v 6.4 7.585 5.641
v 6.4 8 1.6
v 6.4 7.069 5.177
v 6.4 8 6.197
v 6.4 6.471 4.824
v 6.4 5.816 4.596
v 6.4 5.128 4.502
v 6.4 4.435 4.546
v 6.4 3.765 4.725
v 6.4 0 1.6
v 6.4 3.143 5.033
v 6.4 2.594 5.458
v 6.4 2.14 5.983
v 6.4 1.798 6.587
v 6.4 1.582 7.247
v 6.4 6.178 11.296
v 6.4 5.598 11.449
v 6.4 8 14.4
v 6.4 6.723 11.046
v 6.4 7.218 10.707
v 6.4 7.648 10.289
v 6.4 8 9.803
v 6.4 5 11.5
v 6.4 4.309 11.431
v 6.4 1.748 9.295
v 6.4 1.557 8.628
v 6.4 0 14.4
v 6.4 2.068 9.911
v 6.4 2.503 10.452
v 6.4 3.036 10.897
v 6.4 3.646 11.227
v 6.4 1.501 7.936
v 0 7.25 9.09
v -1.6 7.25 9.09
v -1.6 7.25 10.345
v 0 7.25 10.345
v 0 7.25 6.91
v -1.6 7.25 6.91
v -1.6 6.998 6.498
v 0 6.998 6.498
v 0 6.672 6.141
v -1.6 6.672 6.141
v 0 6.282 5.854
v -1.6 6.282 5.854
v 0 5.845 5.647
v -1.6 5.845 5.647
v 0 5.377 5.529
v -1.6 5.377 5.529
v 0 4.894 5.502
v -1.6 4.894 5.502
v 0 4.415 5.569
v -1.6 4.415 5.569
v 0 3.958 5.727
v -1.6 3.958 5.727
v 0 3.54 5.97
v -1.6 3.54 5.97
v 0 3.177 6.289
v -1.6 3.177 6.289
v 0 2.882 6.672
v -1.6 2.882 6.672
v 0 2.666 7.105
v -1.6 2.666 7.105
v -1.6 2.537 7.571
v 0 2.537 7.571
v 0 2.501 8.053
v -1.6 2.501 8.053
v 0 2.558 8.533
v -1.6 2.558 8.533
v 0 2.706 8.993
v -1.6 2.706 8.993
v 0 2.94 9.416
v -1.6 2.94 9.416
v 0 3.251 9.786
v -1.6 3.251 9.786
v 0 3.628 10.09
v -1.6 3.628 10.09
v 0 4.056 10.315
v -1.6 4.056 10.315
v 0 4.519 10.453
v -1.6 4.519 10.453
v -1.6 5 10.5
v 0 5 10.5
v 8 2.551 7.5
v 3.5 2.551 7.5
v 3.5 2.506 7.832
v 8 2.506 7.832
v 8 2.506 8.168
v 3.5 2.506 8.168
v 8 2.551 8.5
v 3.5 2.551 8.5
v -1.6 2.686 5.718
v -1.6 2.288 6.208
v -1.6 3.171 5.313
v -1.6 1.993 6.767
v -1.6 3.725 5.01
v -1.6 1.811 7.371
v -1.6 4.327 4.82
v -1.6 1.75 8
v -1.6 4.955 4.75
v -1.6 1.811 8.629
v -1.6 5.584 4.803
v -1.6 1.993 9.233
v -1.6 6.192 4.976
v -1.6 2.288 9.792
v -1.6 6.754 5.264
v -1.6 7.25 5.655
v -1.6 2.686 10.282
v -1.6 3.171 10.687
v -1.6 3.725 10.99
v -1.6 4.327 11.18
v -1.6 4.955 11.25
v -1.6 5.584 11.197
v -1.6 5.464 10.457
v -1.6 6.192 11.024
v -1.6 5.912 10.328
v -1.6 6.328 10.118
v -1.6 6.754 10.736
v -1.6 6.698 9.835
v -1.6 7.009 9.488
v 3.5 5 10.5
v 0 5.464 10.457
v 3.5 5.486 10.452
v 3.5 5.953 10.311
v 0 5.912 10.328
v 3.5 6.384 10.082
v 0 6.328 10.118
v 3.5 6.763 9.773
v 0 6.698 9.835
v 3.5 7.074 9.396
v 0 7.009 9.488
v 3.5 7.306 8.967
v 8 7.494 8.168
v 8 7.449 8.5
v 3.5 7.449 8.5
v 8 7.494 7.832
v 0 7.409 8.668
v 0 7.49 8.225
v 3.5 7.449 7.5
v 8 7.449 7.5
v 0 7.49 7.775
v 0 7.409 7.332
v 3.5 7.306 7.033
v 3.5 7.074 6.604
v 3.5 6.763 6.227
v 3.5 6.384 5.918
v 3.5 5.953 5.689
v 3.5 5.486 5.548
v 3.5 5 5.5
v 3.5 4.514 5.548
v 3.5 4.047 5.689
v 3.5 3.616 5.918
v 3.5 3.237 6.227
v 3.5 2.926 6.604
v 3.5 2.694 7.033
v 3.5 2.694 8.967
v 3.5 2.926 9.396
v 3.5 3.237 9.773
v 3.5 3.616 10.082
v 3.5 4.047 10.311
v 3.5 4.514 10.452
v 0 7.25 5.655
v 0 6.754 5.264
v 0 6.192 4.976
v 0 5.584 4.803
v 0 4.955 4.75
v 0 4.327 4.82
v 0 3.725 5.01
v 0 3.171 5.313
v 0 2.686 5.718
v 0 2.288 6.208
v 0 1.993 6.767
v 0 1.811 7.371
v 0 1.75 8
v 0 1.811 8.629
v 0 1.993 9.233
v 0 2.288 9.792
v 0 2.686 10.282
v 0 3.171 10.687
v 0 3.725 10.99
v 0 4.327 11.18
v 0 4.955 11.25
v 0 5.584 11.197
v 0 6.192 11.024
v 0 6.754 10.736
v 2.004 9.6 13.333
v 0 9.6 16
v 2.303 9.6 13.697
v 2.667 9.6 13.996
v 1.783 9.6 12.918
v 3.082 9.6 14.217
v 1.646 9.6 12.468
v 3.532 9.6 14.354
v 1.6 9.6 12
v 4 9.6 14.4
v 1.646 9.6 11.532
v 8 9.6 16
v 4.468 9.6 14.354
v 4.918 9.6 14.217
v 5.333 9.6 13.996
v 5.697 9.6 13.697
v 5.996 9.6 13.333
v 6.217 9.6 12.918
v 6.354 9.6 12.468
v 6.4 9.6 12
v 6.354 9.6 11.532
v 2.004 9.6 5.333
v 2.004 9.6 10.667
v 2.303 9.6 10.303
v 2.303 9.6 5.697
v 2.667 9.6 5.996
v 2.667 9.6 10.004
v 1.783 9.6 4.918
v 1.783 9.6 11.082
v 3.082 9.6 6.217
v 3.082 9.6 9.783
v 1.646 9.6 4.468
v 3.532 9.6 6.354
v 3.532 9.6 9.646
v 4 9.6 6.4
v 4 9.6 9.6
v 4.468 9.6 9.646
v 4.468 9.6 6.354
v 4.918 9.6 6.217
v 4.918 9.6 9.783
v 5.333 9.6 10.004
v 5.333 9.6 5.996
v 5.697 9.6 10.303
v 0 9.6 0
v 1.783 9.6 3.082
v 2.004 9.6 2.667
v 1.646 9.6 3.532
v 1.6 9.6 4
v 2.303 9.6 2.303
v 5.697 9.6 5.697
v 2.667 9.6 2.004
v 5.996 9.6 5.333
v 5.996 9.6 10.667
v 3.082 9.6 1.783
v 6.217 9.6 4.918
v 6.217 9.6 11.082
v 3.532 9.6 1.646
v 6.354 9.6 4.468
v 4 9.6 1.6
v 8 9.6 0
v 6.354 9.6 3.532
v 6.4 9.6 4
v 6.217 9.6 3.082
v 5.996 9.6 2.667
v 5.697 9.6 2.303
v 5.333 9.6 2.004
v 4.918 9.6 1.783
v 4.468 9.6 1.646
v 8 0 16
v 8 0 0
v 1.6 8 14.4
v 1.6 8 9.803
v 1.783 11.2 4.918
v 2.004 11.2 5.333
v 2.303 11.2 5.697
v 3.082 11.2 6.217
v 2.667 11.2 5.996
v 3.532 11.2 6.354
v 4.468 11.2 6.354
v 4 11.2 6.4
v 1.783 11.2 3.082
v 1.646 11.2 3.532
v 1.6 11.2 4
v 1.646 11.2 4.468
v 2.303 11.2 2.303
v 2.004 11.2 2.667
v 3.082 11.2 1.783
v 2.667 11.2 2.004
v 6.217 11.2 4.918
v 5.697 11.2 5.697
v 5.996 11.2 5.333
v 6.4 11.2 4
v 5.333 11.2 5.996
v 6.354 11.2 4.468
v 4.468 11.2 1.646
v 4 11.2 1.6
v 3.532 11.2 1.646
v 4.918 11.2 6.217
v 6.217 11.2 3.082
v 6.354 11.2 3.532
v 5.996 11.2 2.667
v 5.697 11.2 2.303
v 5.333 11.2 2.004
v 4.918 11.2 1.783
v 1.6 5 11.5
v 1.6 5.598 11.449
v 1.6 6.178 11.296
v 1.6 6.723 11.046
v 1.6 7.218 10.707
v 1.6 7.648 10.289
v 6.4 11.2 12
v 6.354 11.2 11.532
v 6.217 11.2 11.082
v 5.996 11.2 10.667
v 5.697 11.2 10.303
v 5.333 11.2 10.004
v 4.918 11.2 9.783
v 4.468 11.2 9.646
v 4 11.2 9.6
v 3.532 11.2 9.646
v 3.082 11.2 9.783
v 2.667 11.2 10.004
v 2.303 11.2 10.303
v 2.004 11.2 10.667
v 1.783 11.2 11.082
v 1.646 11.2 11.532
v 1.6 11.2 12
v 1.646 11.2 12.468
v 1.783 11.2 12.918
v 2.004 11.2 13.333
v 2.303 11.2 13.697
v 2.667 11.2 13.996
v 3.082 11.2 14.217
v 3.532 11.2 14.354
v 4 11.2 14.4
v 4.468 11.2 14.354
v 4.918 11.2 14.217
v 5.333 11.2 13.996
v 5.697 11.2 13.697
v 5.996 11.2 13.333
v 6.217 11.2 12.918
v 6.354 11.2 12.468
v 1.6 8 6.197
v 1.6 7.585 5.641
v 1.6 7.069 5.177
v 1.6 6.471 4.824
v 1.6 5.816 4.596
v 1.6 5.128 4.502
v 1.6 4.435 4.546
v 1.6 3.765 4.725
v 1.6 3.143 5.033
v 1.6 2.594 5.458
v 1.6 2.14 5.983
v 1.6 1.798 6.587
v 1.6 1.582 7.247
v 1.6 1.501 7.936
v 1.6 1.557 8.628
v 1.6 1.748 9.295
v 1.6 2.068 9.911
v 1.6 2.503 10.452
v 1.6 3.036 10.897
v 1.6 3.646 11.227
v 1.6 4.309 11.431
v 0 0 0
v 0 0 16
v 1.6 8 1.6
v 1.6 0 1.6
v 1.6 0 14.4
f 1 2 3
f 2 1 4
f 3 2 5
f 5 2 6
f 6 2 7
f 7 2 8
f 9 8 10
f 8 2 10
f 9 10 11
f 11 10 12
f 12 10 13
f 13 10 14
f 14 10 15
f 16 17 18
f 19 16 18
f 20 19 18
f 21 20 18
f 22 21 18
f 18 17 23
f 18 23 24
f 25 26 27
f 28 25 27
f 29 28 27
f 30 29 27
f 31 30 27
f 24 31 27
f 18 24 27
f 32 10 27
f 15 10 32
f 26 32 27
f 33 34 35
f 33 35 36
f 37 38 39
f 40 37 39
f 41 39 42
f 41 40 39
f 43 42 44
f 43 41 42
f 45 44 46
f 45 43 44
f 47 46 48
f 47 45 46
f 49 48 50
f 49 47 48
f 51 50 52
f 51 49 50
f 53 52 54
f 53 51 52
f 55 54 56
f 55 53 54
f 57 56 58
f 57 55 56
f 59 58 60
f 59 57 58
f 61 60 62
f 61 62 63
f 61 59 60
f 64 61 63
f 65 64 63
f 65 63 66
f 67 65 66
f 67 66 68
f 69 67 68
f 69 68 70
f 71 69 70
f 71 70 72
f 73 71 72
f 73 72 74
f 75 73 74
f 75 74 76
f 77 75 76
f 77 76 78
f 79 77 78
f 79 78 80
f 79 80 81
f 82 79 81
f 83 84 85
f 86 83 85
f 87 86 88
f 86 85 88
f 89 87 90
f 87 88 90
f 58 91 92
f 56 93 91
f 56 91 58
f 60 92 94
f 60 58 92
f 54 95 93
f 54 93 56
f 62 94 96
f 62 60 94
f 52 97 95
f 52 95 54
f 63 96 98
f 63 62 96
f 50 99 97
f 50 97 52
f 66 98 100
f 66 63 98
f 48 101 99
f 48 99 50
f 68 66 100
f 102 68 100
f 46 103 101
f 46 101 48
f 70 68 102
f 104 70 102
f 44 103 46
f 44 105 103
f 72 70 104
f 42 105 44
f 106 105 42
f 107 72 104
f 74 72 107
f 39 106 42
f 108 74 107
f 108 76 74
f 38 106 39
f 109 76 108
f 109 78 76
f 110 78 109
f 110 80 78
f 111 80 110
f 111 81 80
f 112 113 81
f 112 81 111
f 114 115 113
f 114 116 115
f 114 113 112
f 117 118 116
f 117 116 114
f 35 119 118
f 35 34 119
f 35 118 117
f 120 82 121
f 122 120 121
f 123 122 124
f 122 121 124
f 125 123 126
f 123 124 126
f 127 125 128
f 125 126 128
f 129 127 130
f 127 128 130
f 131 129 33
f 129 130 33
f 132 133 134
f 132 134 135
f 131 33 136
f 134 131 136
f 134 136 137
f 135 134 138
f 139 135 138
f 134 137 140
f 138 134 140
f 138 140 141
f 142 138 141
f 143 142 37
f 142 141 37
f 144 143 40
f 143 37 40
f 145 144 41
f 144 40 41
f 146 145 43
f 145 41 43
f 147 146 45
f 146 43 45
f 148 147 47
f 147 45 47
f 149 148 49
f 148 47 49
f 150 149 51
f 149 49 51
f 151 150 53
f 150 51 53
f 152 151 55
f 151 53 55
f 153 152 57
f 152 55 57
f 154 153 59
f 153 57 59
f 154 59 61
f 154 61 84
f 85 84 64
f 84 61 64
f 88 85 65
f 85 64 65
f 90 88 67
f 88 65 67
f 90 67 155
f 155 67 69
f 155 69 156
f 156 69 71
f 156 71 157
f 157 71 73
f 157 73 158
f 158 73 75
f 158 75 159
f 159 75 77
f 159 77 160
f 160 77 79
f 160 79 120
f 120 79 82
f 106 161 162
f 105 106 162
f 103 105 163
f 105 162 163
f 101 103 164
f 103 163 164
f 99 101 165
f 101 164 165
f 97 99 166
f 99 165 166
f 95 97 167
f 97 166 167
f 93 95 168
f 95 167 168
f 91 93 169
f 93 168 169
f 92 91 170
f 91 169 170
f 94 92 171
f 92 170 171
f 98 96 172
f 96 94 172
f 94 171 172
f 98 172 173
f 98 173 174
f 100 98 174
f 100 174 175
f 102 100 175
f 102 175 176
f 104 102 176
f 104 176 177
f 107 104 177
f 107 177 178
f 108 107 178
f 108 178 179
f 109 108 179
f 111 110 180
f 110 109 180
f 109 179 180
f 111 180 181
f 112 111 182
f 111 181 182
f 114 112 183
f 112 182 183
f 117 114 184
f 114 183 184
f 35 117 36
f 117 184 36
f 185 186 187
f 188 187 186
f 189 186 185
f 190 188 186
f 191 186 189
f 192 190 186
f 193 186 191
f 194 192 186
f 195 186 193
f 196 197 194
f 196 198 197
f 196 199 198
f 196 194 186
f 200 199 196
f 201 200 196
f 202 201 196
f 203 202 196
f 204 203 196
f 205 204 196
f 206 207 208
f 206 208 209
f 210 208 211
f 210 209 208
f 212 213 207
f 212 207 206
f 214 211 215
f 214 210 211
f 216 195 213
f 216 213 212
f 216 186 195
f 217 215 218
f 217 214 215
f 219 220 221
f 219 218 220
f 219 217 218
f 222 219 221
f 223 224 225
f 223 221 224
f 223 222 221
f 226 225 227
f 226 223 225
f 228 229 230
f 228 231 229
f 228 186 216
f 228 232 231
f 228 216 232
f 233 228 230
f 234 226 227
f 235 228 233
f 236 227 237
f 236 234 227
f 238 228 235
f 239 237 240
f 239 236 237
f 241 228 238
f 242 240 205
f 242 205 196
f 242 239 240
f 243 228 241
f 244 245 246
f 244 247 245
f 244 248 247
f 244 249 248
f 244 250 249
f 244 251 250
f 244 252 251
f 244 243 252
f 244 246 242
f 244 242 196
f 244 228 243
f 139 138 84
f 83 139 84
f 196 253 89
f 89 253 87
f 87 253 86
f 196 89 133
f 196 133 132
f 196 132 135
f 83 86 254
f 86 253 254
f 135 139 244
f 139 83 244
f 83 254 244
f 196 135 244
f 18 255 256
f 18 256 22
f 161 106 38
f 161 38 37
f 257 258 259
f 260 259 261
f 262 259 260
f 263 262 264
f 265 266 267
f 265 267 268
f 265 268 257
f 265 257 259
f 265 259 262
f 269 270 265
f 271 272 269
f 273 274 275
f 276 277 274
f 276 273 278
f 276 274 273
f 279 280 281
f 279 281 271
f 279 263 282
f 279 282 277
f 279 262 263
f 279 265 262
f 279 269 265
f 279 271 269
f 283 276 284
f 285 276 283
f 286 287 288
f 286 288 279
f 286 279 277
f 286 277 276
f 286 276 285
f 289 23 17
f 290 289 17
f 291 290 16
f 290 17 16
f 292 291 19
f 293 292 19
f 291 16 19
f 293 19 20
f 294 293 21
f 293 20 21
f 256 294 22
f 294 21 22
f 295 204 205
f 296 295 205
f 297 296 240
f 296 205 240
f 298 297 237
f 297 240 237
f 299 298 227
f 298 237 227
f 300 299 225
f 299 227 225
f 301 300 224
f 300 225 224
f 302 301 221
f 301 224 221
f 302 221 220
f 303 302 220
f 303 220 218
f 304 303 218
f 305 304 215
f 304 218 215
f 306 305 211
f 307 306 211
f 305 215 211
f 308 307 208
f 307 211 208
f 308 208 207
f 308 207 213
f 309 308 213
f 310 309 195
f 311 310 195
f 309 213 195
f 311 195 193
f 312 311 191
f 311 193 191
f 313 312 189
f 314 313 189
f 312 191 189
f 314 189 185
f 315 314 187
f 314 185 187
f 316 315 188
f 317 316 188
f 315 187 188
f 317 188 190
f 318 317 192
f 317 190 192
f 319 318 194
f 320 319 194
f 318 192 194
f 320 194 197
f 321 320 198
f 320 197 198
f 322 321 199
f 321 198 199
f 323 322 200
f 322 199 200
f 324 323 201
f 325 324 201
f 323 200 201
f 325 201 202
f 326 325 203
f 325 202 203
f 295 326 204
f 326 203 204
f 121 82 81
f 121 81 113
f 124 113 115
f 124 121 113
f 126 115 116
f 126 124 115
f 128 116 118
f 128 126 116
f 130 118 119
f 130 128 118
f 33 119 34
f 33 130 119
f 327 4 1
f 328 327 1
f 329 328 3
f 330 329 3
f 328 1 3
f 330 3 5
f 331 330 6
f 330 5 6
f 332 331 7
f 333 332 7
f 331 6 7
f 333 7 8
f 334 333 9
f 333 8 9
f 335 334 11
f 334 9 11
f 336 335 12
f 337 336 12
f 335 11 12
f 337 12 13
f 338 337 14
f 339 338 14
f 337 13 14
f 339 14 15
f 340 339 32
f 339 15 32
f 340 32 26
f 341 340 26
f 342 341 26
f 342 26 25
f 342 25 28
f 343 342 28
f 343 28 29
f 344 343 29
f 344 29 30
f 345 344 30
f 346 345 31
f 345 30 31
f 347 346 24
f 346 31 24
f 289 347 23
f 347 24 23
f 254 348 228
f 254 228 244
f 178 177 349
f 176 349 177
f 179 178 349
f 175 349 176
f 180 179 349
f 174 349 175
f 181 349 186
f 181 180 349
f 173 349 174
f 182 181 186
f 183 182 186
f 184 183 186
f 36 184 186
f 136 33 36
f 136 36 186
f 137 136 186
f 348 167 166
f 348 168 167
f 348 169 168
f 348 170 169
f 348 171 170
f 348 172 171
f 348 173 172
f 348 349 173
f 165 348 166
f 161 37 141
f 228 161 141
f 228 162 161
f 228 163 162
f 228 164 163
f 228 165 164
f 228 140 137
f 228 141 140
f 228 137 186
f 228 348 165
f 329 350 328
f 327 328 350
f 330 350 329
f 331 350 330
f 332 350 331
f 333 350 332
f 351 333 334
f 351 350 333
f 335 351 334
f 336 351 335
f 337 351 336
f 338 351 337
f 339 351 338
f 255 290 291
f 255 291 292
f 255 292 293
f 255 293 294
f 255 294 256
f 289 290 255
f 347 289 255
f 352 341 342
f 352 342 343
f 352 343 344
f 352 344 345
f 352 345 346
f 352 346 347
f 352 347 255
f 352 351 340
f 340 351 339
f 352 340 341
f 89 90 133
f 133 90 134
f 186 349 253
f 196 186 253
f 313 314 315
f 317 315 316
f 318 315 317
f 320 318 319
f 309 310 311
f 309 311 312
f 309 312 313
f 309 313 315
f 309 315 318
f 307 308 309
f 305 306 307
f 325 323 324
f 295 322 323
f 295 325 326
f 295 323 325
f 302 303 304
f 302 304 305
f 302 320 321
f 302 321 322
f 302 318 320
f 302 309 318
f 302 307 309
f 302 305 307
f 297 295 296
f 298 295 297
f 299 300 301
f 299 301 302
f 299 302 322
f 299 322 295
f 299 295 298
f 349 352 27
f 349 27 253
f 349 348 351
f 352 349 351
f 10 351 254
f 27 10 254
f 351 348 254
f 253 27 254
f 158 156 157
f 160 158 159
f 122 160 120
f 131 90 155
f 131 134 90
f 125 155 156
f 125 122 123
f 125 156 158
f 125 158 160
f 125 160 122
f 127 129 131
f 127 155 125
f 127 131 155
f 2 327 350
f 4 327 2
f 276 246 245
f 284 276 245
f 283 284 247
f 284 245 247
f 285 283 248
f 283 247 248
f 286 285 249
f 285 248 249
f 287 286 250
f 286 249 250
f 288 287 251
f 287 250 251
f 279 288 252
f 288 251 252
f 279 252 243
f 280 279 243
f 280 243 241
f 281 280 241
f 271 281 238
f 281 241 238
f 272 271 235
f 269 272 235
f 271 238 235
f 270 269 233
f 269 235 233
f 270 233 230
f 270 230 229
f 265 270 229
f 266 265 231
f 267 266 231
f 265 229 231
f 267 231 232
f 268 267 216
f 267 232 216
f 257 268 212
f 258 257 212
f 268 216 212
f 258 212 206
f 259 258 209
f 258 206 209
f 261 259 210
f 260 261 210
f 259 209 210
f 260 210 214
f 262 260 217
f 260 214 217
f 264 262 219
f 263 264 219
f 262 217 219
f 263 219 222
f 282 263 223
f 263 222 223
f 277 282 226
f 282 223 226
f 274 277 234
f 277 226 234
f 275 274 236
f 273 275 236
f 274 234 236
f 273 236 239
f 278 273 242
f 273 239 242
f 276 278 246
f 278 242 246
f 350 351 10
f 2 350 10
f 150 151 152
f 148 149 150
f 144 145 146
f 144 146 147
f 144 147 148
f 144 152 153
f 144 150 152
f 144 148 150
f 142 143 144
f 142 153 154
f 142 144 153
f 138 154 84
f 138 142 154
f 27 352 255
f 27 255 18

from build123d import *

# Parameters (mm, degrees)
SKETCH1_W           = 8
SKETCH1_H           = 9.6
BOSS_EXTRUDE1_DEPTH = 16
SKETCH4_W           = 4.8
SKETCH4_H           = 12.8
CUT_EXTRUDE1_DEPTH  = 8
SKETCH5_R           = 2.4
BOSS_EXTRUDE2_DEPTH = 1.6
BOSS_EXTRUDE3_DEPTH = 4.8
SKETCH7_R           = 2.5
CUT_EXTRUDE2_DEPTH  = 3.5
CUT_EXTRUDE3_DEPTH  = 4.5
SKETCH9_R           = 3.25
SKETCH9_R_2         = 2.5
BOSS_EXTRUDE4_DEPTH = 1.6
SKETCH10_W          = 1.6
SKETCH10_H          = 6.5
CUT_EXTRUDE4_DEPTH  = 1


with BuildPart() as part:
    # Sketch1 → Boss-Extrude1 (new body)
    with BuildSketch(Plane.XY):
        with Locations((4, 4.8)):
            Rectangle(SKETCH1_W, SKETCH1_H)
    extrude(amount=BOSS_EXTRUDE1_DEPTH)

    # Sketch4 → Cut-Extrude1 (cut)
    with BuildSketch(Plane.XZ):
        with Locations((4, 8)):
            Rectangle(SKETCH4_W, SKETCH4_H)
    extrude(amount=-CUT_EXTRUDE1_DEPTH, mode=Mode.SUBTRACT)

    # Sketch5 → Boss-Extrude2 (add)
    with BuildSketch(Plane(origin=(0, 9.6, 0), x_dir=(1, 0, 0), z_dir=(0, 1, 0))):
        with Locations((4, -12)):
            Circle(SKETCH5_R)
        with Locations((4, -4)):
            Circle(SKETCH5_R)
    extrude(amount=BOSS_EXTRUDE2_DEPTH)

    # Sketch6 → Boss-Extrude3 (add)
    with BuildSketch(Plane.ZY.offset(-6.4)):
        with BuildLine():
            ThreePointArc((9.802775638, 8), (8, 8.5), (6.197224362, 8))
            Line((6.197224362, 8), (9.802775638, 8))
        make_face()
        with BuildLine():
            Line((9.802775638, 8), (6.197224362, 8))
            ThreePointArc((6.197224362, 8), (6.276589824, 1.953714169), (11.5, 5))
            ThreePointArc((11.5, 5), (11.046285831, 6.723410176), (9.802775638, 8))
        make_face()
    extrude(amount=BOSS_EXTRUDE3_DEPTH)

    # Sketch7 → Cut-Extrude2 (cut)
    with BuildSketch(Plane.ZY):
        with Locations((8, 5)):
            Circle(SKETCH7_R)
    extrude(amount=-CUT_EXTRUDE2_DEPTH, mode=Mode.SUBTRACT)

    # Sketch8 → Cut-Extrude3 (cut)
    with BuildSketch(Plane.ZY.offset(-3.5)):
        with BuildLine():
            ThreePointArc((8.5, 7.449489743), (8, 7.5), (7.5, 7.449489743))
            Line((7.5, 7.449489743), (7.5, 2.550510257))
            ThreePointArc((7.5, 2.550510257), (8, 2.5), (8.5, 2.550510257))
            Line((8.5, 2.550510257), (8.5, 7.449489743))
        make_face()
    extrude(amount=-CUT_EXTRUDE3_DEPTH, mode=Mode.SUBTRACT)

    # Sketch9 → Boss-Extrude4 (add)
    with BuildSketch(Plane.ZY):
        with Locations((8, 5)):
            Circle(SKETCH9_R)
        with Locations((8, 5)):
            Circle(SKETCH9_R_2, mode=Mode.SUBTRACT)
    extrude(amount=BOSS_EXTRUDE4_DEPTH)

    # Sketch10 → Cut-Extrude4 (cut)
    with BuildSketch(Plane(origin=(0, 8.25, 0), x_dir=(1, 0, 0), z_dir=(0, 1, 0))):
        with Locations((-0.8, -8)):
            Rectangle(SKETCH10_W, SKETCH10_H)
    extrude(amount=-CUT_EXTRUDE4_DEPTH, mode=Mode.SUBTRACT)


solid = part.part
